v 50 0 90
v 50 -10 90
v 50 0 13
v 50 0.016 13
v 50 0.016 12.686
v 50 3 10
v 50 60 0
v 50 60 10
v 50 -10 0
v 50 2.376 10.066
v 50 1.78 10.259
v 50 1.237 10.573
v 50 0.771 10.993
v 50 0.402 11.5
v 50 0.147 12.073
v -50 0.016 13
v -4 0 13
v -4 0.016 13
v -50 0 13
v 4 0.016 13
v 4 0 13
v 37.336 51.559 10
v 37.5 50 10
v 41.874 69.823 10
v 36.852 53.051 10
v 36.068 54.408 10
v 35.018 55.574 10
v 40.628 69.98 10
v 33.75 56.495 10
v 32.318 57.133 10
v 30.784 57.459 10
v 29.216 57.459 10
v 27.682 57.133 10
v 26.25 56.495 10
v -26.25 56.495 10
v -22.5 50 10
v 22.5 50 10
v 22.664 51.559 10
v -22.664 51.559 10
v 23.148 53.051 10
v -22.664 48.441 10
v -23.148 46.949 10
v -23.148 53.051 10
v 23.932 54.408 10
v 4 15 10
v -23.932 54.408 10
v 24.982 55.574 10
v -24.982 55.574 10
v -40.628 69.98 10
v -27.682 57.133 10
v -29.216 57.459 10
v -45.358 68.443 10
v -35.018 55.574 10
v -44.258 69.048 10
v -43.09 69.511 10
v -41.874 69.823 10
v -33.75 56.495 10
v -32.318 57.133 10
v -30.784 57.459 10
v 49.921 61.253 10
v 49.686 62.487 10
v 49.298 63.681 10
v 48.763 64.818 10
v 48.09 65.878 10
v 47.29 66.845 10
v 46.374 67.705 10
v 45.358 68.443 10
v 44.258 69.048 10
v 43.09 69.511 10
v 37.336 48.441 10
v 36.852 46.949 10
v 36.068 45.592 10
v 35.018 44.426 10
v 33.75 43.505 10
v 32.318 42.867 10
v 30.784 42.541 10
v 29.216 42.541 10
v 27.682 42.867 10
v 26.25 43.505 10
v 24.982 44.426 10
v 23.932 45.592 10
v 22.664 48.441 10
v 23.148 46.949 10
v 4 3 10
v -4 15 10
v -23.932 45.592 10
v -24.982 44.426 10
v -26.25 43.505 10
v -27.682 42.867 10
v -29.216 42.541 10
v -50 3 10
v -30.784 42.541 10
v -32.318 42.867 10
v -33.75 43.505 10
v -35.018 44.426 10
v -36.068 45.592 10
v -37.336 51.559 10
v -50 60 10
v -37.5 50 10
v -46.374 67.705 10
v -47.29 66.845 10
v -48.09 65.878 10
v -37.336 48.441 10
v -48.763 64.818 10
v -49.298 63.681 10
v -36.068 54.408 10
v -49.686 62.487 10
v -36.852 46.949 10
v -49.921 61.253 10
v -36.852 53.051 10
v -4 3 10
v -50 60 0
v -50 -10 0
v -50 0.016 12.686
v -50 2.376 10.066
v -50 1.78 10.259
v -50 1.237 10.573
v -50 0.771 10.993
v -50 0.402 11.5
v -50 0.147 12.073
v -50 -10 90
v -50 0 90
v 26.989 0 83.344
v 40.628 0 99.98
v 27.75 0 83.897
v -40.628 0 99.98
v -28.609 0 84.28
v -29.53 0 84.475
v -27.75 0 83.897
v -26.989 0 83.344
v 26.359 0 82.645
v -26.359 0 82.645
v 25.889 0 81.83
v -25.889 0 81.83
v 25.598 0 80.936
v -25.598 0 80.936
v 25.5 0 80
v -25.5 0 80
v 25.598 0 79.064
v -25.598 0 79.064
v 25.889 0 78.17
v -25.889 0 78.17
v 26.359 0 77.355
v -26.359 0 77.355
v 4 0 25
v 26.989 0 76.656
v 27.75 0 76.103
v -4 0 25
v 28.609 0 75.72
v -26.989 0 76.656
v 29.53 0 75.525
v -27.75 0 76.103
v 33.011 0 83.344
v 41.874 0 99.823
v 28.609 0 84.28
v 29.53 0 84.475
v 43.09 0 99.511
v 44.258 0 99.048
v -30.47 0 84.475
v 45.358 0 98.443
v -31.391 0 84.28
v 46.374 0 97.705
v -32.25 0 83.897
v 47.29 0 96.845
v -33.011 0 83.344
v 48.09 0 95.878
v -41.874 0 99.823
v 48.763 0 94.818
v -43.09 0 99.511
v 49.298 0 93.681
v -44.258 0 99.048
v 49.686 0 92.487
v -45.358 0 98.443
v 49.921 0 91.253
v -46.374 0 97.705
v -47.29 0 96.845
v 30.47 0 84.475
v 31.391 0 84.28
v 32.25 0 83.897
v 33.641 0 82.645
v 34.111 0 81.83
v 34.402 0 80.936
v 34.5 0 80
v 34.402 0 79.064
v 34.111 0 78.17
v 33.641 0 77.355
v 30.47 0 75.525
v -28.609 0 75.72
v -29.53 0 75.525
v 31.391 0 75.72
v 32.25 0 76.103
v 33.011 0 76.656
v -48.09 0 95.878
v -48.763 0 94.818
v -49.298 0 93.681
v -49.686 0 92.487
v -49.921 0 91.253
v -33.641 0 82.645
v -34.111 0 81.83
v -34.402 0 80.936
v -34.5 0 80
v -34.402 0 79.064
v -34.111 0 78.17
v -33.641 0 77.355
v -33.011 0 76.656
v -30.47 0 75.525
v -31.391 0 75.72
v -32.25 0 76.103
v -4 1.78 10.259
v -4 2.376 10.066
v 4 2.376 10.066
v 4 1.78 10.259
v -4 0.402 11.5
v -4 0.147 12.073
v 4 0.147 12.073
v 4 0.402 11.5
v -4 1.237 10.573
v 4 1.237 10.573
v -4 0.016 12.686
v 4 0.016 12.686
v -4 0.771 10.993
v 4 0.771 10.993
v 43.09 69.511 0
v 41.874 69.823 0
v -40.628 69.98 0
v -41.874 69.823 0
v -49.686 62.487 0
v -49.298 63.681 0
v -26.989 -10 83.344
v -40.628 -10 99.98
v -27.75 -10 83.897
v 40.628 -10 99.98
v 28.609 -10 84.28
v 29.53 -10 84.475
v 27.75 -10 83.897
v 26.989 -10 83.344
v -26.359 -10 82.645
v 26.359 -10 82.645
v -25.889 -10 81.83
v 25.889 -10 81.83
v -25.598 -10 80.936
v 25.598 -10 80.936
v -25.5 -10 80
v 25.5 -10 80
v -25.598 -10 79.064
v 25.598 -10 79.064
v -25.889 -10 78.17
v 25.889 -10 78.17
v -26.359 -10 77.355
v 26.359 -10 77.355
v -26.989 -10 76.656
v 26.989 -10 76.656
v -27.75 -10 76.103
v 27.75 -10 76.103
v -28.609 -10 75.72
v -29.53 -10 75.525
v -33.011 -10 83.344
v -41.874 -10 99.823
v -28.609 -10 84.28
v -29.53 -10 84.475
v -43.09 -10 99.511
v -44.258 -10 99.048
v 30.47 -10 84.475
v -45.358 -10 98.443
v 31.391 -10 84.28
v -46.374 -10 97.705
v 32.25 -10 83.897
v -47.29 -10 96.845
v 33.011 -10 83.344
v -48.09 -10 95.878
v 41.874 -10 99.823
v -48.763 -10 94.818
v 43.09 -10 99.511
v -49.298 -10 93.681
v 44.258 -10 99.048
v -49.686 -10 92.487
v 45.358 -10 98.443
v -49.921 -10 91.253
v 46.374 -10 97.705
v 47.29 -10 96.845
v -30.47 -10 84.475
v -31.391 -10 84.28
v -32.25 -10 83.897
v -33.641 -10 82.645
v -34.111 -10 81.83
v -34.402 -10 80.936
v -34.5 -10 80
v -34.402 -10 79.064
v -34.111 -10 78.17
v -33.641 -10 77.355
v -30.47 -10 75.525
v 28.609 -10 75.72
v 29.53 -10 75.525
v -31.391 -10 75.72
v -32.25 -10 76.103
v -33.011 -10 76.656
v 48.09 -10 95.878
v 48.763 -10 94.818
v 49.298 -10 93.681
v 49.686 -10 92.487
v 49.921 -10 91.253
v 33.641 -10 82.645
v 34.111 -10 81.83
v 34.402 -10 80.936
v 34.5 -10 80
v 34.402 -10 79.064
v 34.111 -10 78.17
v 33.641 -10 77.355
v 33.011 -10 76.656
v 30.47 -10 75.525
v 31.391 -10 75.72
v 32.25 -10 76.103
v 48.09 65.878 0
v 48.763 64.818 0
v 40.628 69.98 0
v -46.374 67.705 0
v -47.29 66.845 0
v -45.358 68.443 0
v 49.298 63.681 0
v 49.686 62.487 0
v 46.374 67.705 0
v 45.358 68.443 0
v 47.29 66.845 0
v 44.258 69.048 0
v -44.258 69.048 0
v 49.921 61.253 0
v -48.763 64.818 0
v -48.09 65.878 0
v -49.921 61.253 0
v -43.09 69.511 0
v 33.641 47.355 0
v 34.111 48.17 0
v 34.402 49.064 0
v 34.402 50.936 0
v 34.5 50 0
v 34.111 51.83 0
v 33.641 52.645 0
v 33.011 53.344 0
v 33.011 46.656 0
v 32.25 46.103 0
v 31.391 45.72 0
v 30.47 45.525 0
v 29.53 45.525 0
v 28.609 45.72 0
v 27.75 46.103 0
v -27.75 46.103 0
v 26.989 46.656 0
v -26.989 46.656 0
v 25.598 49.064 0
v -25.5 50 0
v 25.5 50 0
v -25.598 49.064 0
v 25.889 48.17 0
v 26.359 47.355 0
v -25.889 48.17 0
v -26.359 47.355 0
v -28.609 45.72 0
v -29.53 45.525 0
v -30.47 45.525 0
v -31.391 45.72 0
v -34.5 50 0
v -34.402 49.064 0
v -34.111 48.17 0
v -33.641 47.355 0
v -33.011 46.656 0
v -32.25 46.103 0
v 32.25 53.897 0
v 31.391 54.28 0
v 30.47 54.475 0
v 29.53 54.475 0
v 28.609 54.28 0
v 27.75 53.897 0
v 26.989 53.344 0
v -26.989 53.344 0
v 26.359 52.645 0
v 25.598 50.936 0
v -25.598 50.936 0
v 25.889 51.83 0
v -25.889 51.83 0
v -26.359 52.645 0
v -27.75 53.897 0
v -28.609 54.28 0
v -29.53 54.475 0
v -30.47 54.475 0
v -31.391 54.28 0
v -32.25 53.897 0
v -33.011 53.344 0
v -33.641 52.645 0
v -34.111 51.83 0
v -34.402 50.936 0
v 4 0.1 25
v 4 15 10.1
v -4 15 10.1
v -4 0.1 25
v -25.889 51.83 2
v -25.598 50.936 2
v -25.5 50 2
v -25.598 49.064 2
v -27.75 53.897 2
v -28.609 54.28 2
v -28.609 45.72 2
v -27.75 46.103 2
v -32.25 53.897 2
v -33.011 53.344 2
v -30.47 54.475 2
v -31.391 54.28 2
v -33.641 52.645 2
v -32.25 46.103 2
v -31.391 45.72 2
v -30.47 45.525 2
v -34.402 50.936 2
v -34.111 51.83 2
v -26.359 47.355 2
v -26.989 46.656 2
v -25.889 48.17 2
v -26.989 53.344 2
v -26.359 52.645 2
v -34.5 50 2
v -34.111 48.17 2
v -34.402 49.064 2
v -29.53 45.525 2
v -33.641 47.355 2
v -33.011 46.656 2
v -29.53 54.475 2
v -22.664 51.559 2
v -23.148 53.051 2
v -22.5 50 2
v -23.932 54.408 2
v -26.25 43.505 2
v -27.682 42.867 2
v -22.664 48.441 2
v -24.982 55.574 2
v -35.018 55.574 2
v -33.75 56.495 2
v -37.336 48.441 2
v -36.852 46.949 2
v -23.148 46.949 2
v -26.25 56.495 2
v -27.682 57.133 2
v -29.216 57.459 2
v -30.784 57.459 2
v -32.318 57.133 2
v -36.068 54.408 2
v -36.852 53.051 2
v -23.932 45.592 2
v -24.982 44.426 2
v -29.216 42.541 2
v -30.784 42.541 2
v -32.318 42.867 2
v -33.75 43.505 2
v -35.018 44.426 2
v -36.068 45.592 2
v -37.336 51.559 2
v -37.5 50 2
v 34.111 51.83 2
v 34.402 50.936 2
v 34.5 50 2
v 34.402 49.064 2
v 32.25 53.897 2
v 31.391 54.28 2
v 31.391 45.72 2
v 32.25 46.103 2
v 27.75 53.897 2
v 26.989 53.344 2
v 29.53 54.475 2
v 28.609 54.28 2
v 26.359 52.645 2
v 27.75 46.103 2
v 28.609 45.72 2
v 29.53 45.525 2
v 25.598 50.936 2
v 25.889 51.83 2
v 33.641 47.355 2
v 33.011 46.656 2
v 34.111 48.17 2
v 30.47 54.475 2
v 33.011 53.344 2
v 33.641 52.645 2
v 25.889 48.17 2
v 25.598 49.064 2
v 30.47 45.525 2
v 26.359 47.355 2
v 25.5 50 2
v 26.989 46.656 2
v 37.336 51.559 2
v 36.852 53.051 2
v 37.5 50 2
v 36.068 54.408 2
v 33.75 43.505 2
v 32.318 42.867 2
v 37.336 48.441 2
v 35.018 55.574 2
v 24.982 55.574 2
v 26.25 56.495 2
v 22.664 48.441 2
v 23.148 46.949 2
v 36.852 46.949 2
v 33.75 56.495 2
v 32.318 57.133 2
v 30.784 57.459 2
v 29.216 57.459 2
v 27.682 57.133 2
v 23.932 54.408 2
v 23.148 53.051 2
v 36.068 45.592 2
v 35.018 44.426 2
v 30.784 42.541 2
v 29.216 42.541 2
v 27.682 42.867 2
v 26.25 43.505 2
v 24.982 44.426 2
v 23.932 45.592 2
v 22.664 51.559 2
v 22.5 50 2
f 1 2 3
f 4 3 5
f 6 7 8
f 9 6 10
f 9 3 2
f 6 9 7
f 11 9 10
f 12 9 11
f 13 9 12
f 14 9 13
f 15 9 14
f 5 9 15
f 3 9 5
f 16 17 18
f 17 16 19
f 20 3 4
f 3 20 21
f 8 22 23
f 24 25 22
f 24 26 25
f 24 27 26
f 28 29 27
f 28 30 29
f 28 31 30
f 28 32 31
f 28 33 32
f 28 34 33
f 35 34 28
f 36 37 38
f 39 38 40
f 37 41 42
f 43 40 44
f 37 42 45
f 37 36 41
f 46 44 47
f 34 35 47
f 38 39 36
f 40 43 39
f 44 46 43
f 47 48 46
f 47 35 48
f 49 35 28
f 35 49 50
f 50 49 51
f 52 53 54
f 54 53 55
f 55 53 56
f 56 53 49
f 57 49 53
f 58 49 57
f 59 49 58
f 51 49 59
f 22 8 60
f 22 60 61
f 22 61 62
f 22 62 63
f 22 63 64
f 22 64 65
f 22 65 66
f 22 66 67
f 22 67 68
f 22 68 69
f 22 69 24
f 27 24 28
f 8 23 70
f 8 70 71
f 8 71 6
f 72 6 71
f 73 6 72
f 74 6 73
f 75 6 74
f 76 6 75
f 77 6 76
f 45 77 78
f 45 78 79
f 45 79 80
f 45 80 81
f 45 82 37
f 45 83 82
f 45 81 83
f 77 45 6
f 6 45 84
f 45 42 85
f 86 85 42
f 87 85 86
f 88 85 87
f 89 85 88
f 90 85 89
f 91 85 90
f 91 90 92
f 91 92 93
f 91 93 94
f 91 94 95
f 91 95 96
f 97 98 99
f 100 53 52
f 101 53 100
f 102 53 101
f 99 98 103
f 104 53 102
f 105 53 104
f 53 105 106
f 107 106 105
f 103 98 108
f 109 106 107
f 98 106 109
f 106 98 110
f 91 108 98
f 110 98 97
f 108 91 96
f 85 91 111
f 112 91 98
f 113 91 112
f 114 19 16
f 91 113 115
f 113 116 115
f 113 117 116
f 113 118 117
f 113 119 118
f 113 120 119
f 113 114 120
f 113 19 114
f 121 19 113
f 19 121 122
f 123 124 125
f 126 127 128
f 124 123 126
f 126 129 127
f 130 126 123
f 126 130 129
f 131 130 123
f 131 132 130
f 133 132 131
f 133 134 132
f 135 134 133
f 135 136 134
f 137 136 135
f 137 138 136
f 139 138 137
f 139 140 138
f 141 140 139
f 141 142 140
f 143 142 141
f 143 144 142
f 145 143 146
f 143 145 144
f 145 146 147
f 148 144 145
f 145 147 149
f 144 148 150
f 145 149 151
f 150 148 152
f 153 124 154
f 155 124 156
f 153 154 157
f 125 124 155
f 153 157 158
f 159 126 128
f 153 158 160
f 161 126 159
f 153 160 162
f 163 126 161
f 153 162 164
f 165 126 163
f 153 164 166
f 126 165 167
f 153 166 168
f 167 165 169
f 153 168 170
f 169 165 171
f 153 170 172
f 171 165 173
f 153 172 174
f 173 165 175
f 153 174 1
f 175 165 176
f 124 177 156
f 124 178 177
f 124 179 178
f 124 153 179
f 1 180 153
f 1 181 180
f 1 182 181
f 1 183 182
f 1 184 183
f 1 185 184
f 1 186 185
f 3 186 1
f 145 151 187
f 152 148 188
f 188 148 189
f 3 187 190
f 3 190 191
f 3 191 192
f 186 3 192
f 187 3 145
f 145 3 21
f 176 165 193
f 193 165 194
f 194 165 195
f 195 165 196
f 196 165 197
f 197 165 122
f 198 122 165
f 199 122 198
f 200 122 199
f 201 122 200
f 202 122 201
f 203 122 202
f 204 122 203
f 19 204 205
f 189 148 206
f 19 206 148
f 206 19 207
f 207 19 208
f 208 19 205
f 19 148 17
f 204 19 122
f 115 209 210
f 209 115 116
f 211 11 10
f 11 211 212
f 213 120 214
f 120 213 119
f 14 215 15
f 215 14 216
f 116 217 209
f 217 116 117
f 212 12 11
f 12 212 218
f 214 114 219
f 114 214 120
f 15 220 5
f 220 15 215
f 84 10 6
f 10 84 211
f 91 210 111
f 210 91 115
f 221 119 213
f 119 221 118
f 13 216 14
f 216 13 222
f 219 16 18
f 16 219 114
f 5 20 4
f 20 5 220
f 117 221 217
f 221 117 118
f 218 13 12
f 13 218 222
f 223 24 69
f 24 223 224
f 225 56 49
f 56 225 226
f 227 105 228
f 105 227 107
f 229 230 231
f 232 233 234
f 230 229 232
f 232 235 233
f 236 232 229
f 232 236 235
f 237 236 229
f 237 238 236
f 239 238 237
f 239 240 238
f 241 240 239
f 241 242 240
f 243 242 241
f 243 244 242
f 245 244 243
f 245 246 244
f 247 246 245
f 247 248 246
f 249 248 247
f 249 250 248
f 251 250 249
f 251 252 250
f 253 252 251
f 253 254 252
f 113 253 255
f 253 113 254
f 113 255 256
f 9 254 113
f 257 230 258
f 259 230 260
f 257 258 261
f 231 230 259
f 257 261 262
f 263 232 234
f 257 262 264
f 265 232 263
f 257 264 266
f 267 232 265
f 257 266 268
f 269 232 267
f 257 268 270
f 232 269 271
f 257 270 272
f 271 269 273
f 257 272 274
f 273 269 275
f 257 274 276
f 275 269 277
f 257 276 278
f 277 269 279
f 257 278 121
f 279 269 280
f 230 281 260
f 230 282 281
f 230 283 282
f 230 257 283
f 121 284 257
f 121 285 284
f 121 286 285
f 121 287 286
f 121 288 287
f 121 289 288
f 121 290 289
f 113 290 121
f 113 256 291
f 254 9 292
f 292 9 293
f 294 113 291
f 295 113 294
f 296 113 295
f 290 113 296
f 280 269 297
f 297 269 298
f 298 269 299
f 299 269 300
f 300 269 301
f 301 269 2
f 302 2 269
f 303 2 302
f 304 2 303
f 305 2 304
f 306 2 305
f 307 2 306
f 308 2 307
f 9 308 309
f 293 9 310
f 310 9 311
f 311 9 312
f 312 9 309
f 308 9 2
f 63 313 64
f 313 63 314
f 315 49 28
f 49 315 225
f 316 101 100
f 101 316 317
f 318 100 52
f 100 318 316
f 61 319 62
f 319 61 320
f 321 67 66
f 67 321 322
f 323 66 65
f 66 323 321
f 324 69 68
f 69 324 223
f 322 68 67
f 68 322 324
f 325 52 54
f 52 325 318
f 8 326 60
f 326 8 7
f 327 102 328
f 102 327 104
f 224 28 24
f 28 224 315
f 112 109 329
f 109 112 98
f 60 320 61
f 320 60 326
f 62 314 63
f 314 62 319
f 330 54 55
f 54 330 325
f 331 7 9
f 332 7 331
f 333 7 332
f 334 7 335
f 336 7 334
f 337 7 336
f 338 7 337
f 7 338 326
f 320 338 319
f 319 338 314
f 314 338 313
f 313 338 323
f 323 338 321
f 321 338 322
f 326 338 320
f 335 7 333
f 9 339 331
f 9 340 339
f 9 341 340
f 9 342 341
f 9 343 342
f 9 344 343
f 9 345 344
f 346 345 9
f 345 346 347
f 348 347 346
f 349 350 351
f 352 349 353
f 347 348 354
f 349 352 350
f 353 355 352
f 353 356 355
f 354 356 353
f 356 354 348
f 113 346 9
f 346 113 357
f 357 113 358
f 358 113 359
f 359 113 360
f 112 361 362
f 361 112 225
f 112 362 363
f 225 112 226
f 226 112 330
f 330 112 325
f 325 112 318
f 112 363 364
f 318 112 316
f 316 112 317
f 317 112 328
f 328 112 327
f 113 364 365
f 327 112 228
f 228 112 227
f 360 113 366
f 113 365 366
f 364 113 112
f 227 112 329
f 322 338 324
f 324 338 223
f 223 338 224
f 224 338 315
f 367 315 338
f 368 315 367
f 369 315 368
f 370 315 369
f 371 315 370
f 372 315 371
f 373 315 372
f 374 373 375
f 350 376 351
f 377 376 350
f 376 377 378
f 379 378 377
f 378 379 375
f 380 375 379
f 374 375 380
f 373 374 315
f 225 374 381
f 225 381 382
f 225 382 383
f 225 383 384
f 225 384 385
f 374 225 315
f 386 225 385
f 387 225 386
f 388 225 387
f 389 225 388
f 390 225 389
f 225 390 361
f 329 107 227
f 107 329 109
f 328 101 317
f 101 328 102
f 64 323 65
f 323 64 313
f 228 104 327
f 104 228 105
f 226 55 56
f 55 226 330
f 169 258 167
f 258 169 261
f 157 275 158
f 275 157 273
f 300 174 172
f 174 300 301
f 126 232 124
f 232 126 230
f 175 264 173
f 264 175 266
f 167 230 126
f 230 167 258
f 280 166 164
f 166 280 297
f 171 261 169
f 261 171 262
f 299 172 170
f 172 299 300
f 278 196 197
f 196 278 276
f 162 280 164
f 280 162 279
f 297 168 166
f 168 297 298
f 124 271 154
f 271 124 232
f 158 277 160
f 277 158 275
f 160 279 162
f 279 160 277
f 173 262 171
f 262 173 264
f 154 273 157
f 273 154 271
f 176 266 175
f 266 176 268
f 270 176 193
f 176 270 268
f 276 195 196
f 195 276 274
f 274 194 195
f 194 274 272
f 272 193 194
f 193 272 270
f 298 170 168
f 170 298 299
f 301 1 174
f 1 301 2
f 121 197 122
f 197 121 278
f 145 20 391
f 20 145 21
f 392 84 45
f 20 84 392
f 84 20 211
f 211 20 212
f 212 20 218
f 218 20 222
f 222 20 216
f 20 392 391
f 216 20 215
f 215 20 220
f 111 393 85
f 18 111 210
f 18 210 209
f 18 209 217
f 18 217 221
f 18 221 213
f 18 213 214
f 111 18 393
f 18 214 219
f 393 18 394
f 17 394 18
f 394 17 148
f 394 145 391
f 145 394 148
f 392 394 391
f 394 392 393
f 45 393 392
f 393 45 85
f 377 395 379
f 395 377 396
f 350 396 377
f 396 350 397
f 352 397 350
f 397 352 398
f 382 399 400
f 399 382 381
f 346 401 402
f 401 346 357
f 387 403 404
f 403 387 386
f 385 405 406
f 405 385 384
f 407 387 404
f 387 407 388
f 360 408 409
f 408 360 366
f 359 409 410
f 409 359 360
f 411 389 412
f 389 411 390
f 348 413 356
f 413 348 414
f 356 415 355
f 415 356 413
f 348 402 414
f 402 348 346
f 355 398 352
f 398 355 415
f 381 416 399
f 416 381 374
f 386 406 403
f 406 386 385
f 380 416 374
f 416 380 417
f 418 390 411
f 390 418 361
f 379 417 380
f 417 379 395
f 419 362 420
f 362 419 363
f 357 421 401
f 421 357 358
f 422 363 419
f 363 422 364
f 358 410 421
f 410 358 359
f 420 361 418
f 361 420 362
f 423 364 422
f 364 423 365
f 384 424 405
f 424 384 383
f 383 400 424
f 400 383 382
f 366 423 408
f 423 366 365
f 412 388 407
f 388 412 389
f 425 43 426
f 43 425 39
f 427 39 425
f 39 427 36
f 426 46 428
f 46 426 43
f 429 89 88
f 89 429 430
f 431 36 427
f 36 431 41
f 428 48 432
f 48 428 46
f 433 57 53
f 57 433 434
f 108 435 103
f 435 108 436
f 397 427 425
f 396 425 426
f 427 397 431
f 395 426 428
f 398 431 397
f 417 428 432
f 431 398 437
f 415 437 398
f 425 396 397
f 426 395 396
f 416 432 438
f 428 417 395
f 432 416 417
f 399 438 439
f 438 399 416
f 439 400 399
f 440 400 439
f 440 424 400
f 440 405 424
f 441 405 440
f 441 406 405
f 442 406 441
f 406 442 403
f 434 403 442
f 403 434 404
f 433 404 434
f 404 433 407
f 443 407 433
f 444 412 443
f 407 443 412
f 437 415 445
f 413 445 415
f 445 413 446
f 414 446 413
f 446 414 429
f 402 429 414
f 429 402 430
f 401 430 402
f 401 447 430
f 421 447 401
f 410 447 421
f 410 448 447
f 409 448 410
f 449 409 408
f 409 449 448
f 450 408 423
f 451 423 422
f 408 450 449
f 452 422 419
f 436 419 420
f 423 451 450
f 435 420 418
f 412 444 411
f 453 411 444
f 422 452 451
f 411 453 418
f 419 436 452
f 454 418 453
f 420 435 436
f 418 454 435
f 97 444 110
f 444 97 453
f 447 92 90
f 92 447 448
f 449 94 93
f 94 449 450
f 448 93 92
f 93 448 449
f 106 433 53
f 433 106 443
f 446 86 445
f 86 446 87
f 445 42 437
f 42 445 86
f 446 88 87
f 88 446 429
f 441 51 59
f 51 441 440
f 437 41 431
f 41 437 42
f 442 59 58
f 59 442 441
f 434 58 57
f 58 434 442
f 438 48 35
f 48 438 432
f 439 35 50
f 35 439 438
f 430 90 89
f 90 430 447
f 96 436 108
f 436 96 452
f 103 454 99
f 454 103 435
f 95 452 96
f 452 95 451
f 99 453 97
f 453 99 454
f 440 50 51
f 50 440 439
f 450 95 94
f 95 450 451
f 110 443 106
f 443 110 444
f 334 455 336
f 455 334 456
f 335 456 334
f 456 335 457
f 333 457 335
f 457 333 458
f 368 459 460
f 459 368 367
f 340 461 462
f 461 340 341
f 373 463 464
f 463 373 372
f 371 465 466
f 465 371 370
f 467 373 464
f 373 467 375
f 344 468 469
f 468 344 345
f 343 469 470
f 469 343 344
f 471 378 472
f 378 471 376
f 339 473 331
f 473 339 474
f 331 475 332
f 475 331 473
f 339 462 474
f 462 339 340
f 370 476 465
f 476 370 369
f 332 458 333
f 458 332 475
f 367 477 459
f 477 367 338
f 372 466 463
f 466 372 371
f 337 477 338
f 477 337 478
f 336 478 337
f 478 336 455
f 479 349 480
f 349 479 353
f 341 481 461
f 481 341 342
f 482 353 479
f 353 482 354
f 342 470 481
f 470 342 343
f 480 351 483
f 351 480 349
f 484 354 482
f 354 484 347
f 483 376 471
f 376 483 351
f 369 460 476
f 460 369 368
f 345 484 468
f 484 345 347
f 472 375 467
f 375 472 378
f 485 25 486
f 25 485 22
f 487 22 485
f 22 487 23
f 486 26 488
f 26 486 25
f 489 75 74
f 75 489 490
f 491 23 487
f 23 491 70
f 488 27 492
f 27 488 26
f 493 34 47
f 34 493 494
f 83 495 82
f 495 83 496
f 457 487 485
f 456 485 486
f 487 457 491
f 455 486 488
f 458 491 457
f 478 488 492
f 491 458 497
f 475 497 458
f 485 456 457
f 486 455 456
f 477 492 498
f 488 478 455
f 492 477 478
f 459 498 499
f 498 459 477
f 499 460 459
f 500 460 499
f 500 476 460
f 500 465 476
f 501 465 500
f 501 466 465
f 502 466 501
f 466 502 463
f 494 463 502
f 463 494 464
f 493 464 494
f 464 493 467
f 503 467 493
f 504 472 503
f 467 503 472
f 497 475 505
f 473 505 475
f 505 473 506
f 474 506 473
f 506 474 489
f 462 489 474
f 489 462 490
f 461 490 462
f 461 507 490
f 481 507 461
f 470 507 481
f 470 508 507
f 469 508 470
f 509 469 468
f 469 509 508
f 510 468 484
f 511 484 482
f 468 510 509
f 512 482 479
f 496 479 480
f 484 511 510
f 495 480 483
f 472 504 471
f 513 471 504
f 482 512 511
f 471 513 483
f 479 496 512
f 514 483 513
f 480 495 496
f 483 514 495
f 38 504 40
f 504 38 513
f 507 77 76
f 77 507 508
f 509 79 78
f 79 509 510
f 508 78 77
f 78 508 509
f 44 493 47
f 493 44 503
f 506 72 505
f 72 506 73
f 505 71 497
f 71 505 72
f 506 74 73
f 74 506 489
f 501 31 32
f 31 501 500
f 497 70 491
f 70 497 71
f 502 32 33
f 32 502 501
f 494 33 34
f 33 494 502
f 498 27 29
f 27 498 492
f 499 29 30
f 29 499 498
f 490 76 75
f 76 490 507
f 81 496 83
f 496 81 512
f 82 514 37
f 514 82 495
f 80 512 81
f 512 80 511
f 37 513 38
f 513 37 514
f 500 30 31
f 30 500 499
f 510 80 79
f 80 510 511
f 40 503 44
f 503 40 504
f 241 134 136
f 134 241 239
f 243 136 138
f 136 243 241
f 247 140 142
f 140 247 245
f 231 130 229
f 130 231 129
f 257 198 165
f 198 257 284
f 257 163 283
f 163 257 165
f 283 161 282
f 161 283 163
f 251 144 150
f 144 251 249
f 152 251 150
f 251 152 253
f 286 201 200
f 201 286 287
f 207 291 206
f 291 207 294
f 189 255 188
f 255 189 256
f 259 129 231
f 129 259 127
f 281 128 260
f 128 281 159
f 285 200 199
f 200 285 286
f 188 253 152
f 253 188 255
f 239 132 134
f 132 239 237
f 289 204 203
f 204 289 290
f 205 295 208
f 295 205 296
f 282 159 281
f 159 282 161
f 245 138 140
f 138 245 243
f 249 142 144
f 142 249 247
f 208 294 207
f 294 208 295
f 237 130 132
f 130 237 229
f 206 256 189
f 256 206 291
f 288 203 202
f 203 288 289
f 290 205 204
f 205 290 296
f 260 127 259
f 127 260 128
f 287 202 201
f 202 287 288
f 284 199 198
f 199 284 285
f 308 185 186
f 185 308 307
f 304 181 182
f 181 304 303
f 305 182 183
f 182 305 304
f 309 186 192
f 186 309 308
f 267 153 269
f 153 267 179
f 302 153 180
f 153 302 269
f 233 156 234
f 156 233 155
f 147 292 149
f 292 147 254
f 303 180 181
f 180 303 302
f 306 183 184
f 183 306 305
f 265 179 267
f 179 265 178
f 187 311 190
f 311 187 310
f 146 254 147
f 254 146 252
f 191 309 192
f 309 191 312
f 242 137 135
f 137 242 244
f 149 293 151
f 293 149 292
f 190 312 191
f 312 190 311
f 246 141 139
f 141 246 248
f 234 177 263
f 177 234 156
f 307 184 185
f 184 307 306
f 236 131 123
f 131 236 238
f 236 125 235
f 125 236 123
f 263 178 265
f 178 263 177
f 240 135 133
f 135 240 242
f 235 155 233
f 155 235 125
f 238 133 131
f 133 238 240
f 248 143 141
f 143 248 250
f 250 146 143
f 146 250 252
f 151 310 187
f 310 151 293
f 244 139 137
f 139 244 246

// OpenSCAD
/* * Heavy-Duty L-Bracket

* Matches the exact specifications from the CAD Assessment Workflow Script.

* Units: Millimeters (mm)

*/

$fn = 50; // Smoothness for high-quality curves/fillets

module l_bracket() {

    difference() {

        // --- PHASE 1, 2, 3 & 5: MAIN BODY (ADDITIVE FEATURES) ---

        union() {

           

            // 1. Base Flange (100mm wide, 80mm deep, 10mm thick)

            // Includes Phase 5 Cosmetic Outer Fillets (10mm radius) at the front

            hull() {

                translate([-40, 60, 0]) cylinder(h=10, r=10); // Front-left corner

                translate([ 40, 60, 0]) cylinder(h=10, r=10); // Front-right corner

                translate([-50, -10, 0]) cube([100, 10, 10]); // Square back edge to merge cleanly

            }

           

            // 2. Vertical Flange (100mm tall, 100mm wide, 10mm thick)

            // Includes Phase 5 Cosmetic Outer Fillets (10mm radius) at the top

            hull() {

                // Top rounded corners (cylinder rotated to face Y-axis)

                translate([-40, 0, 90]) rotate([90, 0, 0]) cylinder(h=10, r=10);

                translate([ 40, 0, 90]) rotate([90, 0, 0]) cylinder(h=10, r=10);

                translate([-50, -10, 0]) cube([100, 10, 10]); // Base connection

            }

           

            // 3. Central Support Gusset / Rib

            // 8mm thick, endpoints 15mm away from the inner corner

            hull() {

                translate([-4, 0, 10]) cube([8, 15, 0.1]); // Base footprint (15mm along Y)

                translate([-4, 0, 10]) cube([8, 0.1, 15]); // Vertical footprint (15mm along Z)

            }

           

            // 4. Phase 5: Structural Fillet (3mm radius at the inner corner)

            // Created by subtracting a cylinder from a small block along the corner

            translate([-50, 0, 10])

            difference() {

                cube([100, 3, 3]);

                // Cylinder shifted up and right to scoop out the curve

                translate([-1, 3, 3]) rotate([0, 90, 0]) cylinder(h=102, r=3, $fn=30);

            }

        }

       

        // --- PHASE 4: MOUNTING HOLES (SUBTRACTIVE FEATURES) ---

       

        // 5. Base Mounting Holes (Standard M8 Counterbore)

        // Positioned symmetrically, 20mm from edges (X=±30, Y=50)

        translate([-30, 50, 0]) {

            translate([0, 0, -1]) cylinder(h=12, r=4.5, $fn=30); // 9mm through hole

            translate([0, 0, 2]) cylinder(h=9, r=7.5, $fn=30);   // 15mm counterbore, 8mm deep

        }

        translate([ 30, 50, 0]) {

            translate([0, 0, -1]) cylinder(h=12, r=4.5, $fn=30);

            translate([0, 0, 2]) cylinder(h=9, r=7.5, $fn=30);

        }

       

        // 6. Vertical Face Mounting Holes (Standard M8 Clearance)

        // Positioned symmetrically, 20mm from top/side edges (X=±30, Z=80)

        // Rotate 90 degrees around X to push the cylinder through the Y axis

        translate([-30, 1, 80]) rotate([90, 0, 0]) cylinder(h=12, r=4.5, $fn=30);

        translate([ 30, 1, 80]) rotate([90, 0, 0]) cylinder(h=12, r=4.5, $fn=30);

    }

}

// Render the final model

color("Silver") 
l_bracket(); 
